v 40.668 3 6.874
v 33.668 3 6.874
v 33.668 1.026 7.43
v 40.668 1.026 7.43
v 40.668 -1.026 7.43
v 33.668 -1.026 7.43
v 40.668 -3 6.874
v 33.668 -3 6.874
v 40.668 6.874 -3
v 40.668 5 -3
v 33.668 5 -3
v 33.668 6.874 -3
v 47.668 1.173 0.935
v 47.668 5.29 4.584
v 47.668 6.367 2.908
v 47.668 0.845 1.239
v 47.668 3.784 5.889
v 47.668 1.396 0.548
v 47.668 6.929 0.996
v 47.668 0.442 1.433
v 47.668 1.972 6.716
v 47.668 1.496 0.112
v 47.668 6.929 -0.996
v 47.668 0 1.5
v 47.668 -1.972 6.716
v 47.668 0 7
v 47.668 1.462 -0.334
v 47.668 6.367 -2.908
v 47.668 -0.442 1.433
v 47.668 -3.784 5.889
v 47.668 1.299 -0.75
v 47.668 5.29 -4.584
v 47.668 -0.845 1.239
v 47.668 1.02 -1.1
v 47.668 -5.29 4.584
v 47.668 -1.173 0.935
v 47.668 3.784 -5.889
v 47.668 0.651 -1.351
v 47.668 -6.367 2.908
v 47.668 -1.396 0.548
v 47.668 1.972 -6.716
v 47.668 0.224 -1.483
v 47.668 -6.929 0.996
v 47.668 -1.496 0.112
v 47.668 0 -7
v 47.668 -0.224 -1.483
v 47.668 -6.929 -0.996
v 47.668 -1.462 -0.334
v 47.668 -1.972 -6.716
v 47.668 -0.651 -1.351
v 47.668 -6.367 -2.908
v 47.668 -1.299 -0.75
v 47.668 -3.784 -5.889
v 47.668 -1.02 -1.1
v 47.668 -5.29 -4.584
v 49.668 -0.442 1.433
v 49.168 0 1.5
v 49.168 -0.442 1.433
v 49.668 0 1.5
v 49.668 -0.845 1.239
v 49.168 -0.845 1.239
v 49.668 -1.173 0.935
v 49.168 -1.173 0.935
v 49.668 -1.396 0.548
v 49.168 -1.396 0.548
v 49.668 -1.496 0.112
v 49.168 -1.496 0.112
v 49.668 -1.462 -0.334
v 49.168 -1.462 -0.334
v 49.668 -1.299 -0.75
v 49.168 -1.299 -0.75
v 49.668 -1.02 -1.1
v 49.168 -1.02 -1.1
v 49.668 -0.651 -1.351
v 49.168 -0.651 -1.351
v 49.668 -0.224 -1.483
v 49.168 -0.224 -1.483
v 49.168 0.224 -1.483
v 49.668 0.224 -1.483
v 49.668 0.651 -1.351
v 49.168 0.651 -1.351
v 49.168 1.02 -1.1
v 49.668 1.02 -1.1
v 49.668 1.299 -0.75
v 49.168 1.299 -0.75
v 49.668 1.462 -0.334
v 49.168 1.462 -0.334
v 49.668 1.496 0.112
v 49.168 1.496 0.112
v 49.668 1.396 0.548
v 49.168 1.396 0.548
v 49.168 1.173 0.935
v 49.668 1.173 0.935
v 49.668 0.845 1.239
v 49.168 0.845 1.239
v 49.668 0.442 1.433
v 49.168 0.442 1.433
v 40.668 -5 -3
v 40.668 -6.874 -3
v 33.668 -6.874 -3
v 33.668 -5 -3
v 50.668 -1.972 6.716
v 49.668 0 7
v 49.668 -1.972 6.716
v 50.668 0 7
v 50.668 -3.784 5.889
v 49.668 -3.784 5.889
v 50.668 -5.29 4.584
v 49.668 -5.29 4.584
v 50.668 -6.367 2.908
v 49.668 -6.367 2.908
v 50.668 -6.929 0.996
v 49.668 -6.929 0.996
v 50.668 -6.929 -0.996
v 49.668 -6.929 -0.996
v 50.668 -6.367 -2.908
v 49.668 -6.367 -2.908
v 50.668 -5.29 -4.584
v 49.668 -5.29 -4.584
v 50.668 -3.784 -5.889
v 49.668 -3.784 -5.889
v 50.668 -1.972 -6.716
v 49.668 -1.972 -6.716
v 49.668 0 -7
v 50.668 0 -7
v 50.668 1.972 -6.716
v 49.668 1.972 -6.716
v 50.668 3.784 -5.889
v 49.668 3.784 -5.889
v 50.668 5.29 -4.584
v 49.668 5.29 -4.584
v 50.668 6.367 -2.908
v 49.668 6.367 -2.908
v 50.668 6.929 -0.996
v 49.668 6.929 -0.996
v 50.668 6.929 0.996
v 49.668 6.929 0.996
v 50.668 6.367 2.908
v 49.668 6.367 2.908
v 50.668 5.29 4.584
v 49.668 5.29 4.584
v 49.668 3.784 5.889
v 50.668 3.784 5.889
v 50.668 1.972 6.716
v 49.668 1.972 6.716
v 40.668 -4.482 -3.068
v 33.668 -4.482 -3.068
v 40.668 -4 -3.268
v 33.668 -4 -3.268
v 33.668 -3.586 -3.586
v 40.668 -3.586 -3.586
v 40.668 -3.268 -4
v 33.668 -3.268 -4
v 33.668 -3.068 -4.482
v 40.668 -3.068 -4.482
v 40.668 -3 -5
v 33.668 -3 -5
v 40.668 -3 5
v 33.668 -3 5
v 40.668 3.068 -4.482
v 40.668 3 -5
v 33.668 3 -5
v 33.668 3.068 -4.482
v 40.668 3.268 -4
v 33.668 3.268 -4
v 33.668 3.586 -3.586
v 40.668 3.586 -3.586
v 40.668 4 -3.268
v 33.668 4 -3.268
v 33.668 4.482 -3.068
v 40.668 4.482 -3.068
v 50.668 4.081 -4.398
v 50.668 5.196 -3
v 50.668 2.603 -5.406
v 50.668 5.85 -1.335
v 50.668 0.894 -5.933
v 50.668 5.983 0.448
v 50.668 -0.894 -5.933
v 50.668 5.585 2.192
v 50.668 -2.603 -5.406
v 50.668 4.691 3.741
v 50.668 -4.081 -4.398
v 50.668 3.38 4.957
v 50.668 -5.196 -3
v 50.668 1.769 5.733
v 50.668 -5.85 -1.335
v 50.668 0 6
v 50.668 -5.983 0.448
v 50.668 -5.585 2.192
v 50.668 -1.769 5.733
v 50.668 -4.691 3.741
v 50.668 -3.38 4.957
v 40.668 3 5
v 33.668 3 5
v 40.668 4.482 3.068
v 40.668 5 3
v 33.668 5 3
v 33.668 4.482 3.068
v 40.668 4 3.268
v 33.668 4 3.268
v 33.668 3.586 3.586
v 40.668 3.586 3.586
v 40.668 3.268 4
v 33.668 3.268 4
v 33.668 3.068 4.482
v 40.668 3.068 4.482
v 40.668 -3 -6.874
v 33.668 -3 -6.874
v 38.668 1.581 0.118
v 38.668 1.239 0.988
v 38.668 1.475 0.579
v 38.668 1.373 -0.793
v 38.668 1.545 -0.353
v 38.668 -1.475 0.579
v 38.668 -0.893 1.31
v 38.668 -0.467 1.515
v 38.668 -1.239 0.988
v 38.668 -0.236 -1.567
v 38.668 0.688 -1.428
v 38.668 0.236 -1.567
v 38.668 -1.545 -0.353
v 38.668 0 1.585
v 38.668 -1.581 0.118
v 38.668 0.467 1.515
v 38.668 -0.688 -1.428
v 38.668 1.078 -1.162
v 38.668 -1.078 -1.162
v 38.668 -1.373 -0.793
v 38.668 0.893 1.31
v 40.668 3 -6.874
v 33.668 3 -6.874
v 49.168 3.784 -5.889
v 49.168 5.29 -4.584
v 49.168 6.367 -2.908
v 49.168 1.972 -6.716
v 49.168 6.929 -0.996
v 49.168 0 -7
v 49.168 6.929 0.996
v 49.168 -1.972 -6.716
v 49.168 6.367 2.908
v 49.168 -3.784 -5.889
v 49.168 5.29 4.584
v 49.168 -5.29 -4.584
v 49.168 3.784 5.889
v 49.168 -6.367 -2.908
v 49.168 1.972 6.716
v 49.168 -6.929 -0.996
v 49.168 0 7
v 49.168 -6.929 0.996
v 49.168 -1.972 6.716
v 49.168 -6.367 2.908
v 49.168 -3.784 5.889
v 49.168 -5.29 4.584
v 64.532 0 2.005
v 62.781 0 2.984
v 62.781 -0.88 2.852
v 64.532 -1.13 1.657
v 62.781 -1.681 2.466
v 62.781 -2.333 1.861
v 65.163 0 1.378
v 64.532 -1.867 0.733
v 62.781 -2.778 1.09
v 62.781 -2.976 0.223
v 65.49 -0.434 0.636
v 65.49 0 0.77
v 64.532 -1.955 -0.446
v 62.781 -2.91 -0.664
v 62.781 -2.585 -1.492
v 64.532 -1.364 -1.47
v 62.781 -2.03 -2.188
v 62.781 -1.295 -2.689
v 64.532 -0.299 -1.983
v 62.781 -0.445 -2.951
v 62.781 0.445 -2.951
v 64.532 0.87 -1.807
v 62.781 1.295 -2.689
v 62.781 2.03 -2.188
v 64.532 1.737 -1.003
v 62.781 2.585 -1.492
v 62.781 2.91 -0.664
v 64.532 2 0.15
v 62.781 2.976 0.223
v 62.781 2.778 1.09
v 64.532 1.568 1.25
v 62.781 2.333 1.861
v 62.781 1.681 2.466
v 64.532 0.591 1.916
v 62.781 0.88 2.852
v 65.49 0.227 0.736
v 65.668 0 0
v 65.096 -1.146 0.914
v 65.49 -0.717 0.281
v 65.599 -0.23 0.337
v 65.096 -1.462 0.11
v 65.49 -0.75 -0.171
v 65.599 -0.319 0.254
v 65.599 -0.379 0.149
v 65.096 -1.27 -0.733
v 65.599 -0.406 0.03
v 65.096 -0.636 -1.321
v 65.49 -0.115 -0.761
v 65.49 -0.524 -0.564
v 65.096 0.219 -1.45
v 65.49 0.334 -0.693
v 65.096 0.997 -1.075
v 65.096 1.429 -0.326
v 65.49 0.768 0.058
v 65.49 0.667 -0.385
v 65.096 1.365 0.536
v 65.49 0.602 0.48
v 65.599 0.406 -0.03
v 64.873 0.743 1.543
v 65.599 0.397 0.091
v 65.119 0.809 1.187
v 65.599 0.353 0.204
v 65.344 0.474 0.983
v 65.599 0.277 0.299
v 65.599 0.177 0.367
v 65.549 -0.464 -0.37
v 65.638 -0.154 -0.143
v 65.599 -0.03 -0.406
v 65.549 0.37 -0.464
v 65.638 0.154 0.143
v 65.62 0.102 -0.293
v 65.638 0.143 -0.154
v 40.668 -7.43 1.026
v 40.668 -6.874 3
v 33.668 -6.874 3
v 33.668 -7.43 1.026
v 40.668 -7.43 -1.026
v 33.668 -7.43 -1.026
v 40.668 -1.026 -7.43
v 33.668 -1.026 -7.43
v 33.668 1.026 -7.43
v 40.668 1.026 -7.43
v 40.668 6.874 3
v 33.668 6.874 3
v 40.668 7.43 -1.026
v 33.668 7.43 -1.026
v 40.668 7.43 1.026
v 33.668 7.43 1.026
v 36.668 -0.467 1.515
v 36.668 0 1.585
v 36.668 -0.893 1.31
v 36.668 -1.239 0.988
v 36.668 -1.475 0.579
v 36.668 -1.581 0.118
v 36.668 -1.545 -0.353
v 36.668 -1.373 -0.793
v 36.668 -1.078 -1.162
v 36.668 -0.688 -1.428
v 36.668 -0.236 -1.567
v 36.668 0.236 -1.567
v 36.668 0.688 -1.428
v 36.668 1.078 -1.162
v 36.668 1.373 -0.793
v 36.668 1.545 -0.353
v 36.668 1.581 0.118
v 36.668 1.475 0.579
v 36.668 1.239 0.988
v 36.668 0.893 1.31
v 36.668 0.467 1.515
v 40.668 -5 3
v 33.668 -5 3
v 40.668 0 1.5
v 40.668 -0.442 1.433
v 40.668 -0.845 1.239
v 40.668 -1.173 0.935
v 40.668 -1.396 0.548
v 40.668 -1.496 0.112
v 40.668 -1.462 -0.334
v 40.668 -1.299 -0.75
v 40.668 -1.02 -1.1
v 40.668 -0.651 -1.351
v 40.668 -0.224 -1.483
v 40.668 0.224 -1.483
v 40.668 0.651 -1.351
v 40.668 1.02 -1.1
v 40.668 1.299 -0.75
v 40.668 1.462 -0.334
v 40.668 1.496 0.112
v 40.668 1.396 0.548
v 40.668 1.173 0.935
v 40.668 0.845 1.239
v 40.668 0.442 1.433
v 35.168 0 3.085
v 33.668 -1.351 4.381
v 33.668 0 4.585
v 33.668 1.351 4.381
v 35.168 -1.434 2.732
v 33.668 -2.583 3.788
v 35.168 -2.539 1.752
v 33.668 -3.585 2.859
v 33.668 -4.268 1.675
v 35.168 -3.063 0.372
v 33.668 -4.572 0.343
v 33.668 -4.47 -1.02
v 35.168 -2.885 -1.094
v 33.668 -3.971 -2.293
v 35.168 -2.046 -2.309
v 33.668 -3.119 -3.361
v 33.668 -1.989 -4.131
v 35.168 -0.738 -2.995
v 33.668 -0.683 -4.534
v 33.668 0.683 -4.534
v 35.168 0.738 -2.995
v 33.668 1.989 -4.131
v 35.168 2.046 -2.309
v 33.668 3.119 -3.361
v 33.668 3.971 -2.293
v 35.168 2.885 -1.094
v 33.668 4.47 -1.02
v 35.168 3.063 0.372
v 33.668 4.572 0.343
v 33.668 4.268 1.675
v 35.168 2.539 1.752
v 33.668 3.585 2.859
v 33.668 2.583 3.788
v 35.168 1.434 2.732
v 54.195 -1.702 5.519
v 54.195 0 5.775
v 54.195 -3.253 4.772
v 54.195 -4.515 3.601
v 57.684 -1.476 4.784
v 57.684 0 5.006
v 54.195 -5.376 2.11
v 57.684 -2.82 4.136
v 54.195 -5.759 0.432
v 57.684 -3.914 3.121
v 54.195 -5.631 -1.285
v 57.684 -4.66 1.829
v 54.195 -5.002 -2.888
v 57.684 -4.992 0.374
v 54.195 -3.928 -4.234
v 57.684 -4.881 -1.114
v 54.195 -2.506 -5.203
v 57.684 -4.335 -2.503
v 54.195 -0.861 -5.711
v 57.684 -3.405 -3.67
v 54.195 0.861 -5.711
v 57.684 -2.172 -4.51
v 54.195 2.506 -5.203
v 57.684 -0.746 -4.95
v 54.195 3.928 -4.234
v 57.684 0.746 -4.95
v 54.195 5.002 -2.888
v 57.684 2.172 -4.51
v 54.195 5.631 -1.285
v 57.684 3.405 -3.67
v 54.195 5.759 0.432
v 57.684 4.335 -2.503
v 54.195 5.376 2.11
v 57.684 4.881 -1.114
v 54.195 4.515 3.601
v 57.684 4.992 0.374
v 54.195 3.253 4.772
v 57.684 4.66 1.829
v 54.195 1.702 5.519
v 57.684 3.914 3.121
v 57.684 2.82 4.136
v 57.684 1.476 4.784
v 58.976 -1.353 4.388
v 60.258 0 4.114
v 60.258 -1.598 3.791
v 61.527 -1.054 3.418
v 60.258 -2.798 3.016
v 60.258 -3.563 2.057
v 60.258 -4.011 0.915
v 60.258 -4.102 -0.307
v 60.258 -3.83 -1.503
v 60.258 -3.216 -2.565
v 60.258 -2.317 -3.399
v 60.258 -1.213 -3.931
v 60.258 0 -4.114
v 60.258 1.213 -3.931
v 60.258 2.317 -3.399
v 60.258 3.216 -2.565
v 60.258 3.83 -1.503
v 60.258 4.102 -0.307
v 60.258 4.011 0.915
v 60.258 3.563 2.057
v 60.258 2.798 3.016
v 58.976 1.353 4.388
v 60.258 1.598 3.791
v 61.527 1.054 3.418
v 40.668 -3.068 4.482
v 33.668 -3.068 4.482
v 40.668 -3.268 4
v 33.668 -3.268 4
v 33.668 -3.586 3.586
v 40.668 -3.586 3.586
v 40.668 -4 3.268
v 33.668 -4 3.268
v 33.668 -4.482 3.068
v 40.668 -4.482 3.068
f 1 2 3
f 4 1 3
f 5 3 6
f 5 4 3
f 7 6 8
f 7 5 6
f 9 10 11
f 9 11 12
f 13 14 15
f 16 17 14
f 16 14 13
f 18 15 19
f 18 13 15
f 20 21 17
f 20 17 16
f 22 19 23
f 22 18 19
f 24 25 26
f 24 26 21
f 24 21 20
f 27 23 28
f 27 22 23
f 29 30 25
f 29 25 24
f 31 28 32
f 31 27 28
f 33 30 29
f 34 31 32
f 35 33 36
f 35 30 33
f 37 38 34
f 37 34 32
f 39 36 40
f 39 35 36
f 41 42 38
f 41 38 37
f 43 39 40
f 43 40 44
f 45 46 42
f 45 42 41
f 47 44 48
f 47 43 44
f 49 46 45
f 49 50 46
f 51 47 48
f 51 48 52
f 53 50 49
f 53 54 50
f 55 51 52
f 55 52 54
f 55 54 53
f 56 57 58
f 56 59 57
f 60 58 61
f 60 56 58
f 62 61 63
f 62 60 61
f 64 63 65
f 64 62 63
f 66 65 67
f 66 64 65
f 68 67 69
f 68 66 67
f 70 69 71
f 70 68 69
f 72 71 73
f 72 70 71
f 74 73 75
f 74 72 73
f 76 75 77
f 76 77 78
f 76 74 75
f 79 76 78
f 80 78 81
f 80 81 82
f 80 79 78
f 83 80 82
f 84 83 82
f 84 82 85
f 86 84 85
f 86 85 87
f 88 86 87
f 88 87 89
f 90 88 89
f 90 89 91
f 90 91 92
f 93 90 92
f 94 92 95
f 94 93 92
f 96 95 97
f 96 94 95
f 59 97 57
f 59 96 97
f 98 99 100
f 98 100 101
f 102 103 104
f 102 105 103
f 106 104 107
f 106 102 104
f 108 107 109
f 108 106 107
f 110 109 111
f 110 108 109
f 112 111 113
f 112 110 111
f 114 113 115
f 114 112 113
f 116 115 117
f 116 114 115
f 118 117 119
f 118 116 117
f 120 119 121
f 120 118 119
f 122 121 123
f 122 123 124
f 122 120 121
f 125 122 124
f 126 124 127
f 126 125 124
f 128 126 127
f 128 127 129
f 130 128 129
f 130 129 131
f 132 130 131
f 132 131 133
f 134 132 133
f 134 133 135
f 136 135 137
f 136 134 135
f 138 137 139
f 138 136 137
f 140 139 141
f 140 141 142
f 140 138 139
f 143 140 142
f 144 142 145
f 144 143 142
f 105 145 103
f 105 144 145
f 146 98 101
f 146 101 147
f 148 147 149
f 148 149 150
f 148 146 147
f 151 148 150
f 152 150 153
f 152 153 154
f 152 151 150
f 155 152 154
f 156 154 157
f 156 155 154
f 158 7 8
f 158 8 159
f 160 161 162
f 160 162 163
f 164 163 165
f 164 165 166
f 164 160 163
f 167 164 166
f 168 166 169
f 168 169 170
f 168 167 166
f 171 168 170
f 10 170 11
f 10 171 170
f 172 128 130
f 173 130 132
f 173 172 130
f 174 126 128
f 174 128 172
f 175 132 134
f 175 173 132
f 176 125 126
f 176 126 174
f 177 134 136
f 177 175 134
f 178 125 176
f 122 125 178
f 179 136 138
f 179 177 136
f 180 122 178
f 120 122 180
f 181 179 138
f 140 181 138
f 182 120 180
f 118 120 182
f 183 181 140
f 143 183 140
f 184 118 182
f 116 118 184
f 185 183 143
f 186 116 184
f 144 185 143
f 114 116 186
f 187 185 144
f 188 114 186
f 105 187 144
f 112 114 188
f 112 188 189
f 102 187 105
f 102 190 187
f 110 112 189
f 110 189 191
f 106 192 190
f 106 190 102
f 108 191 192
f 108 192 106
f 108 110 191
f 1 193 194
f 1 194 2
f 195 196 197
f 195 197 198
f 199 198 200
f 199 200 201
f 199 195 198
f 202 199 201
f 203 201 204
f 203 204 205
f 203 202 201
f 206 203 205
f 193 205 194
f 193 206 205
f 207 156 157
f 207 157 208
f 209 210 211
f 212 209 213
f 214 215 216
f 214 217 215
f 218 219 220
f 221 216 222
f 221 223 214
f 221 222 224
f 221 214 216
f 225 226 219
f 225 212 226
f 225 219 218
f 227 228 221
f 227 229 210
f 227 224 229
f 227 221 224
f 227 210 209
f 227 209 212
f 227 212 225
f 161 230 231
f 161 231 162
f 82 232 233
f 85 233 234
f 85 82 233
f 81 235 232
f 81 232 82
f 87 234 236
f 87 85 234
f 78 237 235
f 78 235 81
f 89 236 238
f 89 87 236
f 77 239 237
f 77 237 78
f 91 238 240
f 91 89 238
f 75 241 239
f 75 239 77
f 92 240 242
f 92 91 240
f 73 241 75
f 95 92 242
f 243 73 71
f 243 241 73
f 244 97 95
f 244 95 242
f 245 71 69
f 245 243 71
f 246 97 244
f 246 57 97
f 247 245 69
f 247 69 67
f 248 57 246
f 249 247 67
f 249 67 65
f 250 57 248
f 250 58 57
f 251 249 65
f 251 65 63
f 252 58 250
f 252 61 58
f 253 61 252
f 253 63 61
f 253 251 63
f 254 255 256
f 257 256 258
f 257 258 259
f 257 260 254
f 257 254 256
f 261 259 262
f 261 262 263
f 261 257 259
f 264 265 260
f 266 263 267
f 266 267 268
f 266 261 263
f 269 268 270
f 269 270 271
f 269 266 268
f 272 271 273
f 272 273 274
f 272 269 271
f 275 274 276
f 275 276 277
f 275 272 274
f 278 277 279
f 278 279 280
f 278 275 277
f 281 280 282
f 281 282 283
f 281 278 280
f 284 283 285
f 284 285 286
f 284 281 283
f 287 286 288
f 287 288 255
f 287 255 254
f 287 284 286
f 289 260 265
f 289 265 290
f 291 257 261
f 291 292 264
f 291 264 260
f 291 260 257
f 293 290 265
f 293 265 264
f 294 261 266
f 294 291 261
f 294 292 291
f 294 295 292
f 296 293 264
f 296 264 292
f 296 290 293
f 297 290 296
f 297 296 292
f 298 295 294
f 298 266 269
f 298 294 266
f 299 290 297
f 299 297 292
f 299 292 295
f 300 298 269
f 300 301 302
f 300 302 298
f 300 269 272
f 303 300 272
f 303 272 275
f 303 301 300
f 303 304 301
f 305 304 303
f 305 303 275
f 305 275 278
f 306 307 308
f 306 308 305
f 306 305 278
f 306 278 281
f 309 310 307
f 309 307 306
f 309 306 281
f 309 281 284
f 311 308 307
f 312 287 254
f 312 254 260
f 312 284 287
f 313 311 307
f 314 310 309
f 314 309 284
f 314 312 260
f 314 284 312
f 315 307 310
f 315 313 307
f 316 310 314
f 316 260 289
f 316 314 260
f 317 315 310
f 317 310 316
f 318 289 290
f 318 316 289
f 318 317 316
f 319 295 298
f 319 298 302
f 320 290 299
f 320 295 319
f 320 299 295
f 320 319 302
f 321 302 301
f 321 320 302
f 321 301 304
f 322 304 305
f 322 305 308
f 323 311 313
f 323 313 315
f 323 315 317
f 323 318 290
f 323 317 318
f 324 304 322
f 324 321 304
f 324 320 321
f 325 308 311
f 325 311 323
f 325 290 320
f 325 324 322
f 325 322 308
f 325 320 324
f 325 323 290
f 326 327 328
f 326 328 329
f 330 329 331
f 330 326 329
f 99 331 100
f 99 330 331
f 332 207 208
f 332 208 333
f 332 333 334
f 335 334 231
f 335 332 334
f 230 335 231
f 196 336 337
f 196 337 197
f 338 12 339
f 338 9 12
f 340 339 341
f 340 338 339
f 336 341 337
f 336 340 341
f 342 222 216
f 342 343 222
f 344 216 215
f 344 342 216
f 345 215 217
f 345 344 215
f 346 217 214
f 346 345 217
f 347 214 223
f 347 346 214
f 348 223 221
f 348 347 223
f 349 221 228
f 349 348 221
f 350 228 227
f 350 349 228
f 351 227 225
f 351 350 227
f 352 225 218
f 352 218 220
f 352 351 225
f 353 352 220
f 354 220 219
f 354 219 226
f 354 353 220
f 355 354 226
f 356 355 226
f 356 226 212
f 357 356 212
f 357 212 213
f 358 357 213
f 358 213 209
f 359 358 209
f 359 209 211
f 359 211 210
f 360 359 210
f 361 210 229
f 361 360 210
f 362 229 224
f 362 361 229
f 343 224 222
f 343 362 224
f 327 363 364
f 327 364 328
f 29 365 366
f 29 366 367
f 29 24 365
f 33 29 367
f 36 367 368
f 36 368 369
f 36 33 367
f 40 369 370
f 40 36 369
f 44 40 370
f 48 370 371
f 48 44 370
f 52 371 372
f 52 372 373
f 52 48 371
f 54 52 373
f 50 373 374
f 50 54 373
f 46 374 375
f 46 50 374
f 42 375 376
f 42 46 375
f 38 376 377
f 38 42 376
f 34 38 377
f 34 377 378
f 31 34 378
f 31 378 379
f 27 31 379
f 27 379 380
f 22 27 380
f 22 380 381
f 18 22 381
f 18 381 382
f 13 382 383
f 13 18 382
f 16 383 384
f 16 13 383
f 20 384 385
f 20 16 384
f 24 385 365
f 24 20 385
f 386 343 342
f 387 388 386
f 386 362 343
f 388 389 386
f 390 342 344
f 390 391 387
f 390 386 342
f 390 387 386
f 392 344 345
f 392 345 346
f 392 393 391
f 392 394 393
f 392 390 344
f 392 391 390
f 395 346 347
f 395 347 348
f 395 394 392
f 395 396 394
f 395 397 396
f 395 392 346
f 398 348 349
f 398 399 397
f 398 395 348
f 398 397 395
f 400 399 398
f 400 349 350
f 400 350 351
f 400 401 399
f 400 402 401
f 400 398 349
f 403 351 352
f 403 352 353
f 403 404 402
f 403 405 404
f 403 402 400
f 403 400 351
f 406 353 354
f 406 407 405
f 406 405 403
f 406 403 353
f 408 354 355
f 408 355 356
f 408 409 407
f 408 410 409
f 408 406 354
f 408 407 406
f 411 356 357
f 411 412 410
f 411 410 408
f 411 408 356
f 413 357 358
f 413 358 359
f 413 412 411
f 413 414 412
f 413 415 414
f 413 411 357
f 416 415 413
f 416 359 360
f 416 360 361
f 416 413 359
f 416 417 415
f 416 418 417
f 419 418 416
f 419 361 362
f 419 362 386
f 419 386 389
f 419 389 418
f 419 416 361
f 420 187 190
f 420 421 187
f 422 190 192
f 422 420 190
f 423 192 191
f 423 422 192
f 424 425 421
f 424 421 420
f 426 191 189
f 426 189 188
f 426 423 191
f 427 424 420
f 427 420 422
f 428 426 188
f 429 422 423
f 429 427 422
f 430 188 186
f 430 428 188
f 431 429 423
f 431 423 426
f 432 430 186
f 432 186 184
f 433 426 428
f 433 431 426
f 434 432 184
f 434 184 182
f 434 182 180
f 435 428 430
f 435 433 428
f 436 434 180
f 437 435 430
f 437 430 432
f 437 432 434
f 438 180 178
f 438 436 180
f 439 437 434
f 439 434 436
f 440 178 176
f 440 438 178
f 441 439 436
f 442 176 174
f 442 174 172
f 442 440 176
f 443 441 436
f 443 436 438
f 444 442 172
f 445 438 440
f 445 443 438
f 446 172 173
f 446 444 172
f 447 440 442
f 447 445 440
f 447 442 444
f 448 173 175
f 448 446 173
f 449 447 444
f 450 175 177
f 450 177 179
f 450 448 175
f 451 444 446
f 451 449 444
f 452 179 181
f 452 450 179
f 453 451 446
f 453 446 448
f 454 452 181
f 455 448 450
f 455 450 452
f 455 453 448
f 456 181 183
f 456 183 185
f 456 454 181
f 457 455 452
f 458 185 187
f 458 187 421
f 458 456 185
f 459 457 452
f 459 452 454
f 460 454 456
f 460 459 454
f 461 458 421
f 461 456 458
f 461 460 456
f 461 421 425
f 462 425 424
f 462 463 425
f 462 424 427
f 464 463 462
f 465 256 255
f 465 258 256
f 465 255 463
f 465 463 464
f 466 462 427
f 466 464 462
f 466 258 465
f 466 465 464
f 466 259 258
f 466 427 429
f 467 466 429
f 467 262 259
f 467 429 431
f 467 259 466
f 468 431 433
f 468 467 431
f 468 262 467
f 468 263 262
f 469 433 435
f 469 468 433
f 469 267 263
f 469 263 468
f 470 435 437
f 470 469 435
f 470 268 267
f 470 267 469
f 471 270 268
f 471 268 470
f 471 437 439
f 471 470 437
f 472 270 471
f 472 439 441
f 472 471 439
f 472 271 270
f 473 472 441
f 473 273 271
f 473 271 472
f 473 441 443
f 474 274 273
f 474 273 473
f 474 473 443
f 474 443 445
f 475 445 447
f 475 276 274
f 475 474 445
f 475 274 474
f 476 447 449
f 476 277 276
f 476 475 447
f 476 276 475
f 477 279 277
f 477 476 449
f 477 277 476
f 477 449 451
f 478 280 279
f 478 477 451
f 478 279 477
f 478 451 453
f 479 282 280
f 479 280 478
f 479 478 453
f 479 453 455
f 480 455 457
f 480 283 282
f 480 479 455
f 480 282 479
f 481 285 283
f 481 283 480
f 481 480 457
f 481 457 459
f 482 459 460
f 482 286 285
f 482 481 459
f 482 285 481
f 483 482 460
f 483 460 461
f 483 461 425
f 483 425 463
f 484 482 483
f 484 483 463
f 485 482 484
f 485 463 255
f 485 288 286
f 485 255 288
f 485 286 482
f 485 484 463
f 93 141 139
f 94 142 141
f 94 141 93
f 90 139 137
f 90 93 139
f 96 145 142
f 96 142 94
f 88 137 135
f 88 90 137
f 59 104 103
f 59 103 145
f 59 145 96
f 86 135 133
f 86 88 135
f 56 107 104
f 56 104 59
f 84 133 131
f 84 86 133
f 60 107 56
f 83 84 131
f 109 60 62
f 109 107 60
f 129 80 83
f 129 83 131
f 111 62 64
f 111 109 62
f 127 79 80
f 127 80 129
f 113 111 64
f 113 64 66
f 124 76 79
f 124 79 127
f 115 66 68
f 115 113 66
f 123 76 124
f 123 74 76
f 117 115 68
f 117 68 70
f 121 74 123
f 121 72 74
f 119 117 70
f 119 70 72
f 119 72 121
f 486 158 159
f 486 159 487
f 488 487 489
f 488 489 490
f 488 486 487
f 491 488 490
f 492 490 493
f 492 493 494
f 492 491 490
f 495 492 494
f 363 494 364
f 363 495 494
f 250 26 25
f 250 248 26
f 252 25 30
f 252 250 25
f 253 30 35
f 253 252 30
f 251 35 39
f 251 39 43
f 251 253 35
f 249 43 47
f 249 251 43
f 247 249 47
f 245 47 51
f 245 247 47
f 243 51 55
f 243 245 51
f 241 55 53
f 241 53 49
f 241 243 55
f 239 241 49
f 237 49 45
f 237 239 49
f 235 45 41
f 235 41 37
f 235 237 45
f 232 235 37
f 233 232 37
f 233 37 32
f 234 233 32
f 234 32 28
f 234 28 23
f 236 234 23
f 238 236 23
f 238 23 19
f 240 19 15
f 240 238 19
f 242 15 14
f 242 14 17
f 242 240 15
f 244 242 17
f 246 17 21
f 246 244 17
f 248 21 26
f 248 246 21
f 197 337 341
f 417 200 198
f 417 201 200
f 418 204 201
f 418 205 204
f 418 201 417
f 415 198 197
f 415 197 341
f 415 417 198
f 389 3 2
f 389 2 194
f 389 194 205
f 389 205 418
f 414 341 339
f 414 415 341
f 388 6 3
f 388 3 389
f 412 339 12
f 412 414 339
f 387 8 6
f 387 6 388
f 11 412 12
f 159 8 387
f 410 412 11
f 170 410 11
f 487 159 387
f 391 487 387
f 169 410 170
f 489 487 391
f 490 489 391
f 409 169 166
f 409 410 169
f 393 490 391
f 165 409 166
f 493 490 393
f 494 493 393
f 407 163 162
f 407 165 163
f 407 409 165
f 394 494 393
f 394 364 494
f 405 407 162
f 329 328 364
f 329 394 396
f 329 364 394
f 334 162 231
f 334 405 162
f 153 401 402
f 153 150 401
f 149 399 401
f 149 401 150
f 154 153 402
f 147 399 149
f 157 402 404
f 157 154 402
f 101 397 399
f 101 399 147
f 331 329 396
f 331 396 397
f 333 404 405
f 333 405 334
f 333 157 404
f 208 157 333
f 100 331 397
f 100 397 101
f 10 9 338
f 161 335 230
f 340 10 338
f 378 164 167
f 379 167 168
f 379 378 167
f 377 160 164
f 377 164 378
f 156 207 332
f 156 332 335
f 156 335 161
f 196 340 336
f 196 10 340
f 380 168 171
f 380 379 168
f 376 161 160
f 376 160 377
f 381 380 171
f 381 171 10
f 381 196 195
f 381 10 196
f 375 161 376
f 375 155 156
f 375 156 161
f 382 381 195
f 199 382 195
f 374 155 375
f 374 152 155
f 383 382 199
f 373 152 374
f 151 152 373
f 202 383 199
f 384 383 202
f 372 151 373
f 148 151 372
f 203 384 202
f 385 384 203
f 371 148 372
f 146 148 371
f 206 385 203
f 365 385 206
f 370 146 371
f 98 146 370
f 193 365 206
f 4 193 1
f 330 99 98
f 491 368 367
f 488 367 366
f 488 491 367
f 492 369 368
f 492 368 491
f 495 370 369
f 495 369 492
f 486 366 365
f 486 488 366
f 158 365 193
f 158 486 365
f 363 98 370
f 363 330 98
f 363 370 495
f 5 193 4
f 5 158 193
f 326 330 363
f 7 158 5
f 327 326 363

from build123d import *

# Parameters (mm, degrees)
ENL_V_START             = -10
ENL_V_MAT_EXTRU_1_DEPTH = 10


with BuildPart() as part:
    # Esquisse1 → Révolution1 (revolve)
    with BuildSketch(Plane.XY):
        with BuildLine():
            Line((38.667823993, 0), (38.667823993, 1.585))
            Line((38.667823993, 1.585), (36.667823993, 1.585))
            Line((36.667823993, 1.585), (33.667823993, 4.585))
            Line((33.667823993, 4.585), (33.667823993, 7.5))
            Line((33.667823993, 7.5), (40.667823993, 7.5))
            Line((40.667823993, 7.5), (40.667823993, 1.5))
            Line((40.667823993, 1.5), (47.667823993, 1.5))
            Line((47.667823993, 1.5), (47.667823993, 7))
            Line((47.667823993, 7), (49.167823993, 7))
            Line((49.167823993, 7), (49.167823993, 1.5))
            Line((49.167823993, 1.5), (49.667823993, 1.5))
            Line((49.667823993, 1.5), (49.667823993, 7))
            Line((49.667823993, 7), (50.667823993, 7))
            Line((50.667823993, 7), (50.667823993, 6))
            add(Edge.make_bspline(
                [(50.667823993, 6), (54.792010738, 6.082824703), (58.901540934, 4.911130099), (62.781307834, 2.984328023)],
                knots=[0, 0, 0, 0, 1, 1, 1, 1], degree=3))
            add(Edge.make_bspline(
                [(62.781307834, 2.984328023), (64.265948318, 2.24701353), (65.473917032, 1.727596368), (65.667823993, 0)],
                knots=[0, 0, 0, 0, 1, 1, 1, 1], degree=3))
            Line((65.667823993, 0), (38.667823993, 0))
        make_face()
    revolve(axis=Axis((0, 0, 0), (1, 0, 0)))

    # Esquisse2 → Enlèv. mat.-Extru.1 (cut)
    with BuildSketch(Plane.ZY.offset(-33.667823993).offset(ENL_V_START)):
        with BuildLine():
            ThreePointArc((6.873863542, 3), (5.303300859, 5.303300859), (3, 6.873863542))
            Line((3, 6.873863542), (3, 5))
            ThreePointArc((3, 5), (3.585786438, 3.585786438), (5, 3))
            Line((5, 3), (6.873863542, 3))
        make_face()
        with BuildLine():
            Line((-3, 5), (-3, 6.873863542))
            ThreePointArc((-3, 6.873863542), (-5.303300859, 5.303300859), (-6.873863542, 3))
            Line((-6.873863542, 3), (-5, 3))
            ThreePointArc((-5, 3), (-3.585786438, 3.585786438), (-3, 5))
        make_face()
        with BuildLine():
            ThreePointArc((3, -6.873863542), (5.303300859, -5.303300859), (6.873863542, -3))
            Line((6.873863542, -3), (5, -3))
            ThreePointArc((5, -3), (3.585786438, -3.585786438), (3, -5))
            Line((3, -5), (3, -6.873863542))
        make_face()
        with BuildLine():
            Line((-5, -3), (-6.873863542, -3))
            ThreePointArc((-6.873863542, -3), (-5.303300859, -5.303300859), (-3, -6.873863542))
            Line((-3, -6.873863542), (-3, -5))
            ThreePointArc((-3, -5), (-3.585786438, -3.585786438), (-5, -3))
        make_face()
    extrude(amount=ENL_V_MAT_EXTRU_1_DEPTH, mode=Mode.SUBTRACT)


solid = part.part
